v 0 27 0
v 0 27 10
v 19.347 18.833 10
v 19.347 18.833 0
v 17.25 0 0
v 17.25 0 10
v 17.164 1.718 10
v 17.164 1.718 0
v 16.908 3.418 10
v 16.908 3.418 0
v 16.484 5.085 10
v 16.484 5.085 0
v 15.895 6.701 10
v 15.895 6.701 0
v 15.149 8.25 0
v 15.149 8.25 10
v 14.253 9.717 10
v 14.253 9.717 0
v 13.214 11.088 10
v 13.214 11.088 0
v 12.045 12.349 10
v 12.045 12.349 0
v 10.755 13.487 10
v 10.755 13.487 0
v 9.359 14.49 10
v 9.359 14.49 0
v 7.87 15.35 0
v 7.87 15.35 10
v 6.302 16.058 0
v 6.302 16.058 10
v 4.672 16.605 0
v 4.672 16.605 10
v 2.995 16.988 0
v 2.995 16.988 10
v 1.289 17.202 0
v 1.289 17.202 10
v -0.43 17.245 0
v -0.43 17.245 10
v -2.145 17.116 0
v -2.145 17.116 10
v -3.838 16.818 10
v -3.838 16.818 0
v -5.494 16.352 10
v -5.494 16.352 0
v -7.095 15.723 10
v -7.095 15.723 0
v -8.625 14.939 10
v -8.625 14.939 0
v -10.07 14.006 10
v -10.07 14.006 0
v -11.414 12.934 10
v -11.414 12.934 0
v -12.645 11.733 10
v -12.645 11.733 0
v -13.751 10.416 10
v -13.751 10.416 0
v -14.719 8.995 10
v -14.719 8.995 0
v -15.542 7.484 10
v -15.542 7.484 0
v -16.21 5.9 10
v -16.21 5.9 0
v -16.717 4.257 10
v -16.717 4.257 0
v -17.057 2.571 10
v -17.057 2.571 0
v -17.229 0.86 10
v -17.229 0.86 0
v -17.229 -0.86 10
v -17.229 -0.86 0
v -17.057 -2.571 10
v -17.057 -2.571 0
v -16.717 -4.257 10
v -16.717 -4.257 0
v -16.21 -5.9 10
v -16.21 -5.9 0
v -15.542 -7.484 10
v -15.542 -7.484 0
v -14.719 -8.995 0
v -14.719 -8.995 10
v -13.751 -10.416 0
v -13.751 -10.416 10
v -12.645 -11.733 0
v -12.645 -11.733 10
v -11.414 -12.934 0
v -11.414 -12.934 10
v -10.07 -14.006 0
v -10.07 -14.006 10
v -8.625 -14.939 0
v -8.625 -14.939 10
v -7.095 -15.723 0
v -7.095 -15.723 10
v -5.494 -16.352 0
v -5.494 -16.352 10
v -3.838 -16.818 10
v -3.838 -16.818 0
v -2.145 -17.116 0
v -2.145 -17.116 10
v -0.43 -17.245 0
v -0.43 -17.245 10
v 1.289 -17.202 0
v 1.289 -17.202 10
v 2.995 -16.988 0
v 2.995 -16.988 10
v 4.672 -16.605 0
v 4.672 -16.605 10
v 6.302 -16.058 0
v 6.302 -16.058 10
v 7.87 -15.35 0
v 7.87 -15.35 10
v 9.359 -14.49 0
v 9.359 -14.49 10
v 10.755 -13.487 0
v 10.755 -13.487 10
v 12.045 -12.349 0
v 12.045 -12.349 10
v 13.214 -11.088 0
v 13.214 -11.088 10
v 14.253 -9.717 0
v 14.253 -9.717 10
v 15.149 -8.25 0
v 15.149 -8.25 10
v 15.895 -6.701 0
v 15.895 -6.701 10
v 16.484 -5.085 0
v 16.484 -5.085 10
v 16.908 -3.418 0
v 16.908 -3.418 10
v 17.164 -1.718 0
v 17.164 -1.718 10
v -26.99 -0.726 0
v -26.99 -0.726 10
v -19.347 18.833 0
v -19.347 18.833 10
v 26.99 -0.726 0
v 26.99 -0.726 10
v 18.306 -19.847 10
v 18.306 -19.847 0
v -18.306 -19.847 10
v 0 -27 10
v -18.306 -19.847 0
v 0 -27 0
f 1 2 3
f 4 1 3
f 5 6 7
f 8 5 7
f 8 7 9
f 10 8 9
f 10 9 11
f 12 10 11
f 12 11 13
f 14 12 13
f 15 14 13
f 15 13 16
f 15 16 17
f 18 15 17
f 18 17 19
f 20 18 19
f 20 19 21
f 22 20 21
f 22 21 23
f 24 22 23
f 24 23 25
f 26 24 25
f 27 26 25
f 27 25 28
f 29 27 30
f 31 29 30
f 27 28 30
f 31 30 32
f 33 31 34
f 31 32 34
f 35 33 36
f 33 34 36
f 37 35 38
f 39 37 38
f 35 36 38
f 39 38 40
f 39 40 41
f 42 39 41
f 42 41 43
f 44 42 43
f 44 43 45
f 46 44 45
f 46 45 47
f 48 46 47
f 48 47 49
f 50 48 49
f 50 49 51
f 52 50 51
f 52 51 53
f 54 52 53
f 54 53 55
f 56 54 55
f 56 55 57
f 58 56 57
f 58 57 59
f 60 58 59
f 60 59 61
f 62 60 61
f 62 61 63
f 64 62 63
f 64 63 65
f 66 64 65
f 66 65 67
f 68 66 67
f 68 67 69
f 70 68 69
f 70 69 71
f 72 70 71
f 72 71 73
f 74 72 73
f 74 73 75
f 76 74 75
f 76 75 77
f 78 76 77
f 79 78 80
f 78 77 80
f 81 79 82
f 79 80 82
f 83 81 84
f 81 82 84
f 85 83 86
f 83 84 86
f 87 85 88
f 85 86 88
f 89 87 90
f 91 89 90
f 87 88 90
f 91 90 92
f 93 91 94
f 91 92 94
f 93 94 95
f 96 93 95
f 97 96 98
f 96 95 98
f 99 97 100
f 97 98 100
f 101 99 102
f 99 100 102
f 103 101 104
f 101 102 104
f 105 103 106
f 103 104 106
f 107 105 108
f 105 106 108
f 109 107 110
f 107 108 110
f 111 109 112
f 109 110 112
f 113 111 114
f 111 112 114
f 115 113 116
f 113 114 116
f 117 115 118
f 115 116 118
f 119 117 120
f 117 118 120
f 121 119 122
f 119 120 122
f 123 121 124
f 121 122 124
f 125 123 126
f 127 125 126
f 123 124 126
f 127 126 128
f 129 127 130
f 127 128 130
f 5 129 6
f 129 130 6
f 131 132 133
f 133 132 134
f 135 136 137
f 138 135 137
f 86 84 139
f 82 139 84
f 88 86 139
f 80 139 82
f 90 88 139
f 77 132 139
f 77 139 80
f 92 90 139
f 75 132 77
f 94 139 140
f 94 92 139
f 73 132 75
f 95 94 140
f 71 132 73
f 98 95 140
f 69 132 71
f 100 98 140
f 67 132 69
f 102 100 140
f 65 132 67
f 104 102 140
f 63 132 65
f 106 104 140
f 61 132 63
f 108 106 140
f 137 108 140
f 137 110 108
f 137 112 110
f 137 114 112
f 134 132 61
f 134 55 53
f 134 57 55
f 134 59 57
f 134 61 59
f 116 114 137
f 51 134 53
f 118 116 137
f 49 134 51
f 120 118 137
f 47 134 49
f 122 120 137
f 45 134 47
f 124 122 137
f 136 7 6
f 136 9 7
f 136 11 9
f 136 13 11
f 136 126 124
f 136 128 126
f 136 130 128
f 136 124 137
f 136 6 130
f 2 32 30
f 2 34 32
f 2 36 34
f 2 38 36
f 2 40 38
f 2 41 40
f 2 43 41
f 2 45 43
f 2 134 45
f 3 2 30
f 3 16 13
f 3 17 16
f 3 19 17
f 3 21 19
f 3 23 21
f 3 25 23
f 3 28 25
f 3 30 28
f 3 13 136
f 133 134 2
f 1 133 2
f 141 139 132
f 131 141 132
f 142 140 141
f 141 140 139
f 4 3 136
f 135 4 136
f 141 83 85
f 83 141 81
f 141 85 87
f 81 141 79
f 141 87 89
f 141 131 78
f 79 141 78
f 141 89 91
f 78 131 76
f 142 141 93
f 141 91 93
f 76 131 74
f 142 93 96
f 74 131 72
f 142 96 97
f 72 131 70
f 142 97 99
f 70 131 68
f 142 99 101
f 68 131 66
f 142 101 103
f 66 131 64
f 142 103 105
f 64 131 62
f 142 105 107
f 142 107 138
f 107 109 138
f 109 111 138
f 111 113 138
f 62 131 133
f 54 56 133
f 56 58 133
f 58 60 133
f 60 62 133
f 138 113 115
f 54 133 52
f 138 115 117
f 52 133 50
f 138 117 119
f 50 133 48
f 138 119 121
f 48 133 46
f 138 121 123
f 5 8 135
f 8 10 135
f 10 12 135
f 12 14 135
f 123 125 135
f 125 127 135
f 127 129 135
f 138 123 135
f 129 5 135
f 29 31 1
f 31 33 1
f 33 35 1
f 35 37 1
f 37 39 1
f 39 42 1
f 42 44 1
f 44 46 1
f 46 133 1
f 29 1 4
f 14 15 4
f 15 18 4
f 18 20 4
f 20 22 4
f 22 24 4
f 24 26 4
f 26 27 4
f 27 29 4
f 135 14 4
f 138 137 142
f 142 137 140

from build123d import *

# Parameters (mm, degrees)
F0_R     = 27
F1_DEPTH = 10
F2_R     = 17.25
F3_DEPTH = 25
F5_DEPTH = 25


with BuildPart() as f1:
    # F0 (on Top) → F1 (new body)
    with BuildSketch(Plane.XY):
        Circle(F0_R)
    extrude(amount=F1_DEPTH)

    # F2 (on face) → F3 (cut)
    with BuildSketch(Plane.XY.offset(10)):
        Circle(F2_R)
    extrude(amount=-F3_DEPTH, mode=Mode.SUBTRACT)

    # F4 (on face) → F5 (cut)
    with BuildSketch(Plane.XY.offset(10)):
        with BuildLine():
            Line((-26.9902284894, -0.7263374486), (-19.3469779437, 18.8333333333))
            ThreePointArc((-19.3469779437, 18.8333333333), (-25.1481481481, 9.8270364159), (-26.9902284894, -0.7263374486))
        make_face()
        with BuildLine():
            Line((-19.3469779437, 18.8333333333), (0, 27))
            ThreePointArc((0, 27), (-10.5, 24.8746859277), (-19.3469779437, 18.8333333333))
        make_face()
        with BuildLine():
            ThreePointArc((19.3469779437, 18.8333333333), (10.5, 24.8746859277), (0, 27))
            Line((0, 27), (19.3469779437, 18.8333333333))
        make_face()
        with BuildLine():
            ThreePointArc((27, 0), (25.0136803018, 10.1644378969), (19.3469779437, 18.8333333333))
            Line((19.3469779437, 18.8333333333), (26.9902284894, -0.7263374486))
            ThreePointArc((26.9902284894, -0.7263374486), (26.9975570118, -0.3632015871), (27, 0))
        make_face()
        with BuildLine():
            ThreePointArc((18.3060568625, -19.8466189097), (24.5832190215, -11.1653635203), (26.9902284894, -0.7263374486))
            Line((26.9902284894, -0.7263374486), (18.3060568625, -19.8466189097))
        make_face()
        with BuildLine():
            ThreePointArc((0, -27), (9.8270364159, -25.1481481481), (18.3060568625, -19.8466189097))
            Line((18.3060568625, -19.8466189097), (0, -27))
        make_face()
        with BuildLine():
            Line((0, -27), (-18.3060568625, -19.8466189097))
            ThreePointArc((-18.3060568625, -19.8466189097), (-9.8270364159, -25.1481481481), (0, -27))
        make_face()
        with BuildLine():
            Line((-18.3060568625, -19.8466189097), (-26.9902284894, -0.7263374486))
            ThreePointArc((-26.9902284894, -0.7263374486), (-24.5832190215, -11.1653635203), (-18.3060568625, -19.8466189097))
        make_face()
    extrude(amount=-F5_DEPTH, mode=Mode.SUBTRACT)


solid = f1.part
